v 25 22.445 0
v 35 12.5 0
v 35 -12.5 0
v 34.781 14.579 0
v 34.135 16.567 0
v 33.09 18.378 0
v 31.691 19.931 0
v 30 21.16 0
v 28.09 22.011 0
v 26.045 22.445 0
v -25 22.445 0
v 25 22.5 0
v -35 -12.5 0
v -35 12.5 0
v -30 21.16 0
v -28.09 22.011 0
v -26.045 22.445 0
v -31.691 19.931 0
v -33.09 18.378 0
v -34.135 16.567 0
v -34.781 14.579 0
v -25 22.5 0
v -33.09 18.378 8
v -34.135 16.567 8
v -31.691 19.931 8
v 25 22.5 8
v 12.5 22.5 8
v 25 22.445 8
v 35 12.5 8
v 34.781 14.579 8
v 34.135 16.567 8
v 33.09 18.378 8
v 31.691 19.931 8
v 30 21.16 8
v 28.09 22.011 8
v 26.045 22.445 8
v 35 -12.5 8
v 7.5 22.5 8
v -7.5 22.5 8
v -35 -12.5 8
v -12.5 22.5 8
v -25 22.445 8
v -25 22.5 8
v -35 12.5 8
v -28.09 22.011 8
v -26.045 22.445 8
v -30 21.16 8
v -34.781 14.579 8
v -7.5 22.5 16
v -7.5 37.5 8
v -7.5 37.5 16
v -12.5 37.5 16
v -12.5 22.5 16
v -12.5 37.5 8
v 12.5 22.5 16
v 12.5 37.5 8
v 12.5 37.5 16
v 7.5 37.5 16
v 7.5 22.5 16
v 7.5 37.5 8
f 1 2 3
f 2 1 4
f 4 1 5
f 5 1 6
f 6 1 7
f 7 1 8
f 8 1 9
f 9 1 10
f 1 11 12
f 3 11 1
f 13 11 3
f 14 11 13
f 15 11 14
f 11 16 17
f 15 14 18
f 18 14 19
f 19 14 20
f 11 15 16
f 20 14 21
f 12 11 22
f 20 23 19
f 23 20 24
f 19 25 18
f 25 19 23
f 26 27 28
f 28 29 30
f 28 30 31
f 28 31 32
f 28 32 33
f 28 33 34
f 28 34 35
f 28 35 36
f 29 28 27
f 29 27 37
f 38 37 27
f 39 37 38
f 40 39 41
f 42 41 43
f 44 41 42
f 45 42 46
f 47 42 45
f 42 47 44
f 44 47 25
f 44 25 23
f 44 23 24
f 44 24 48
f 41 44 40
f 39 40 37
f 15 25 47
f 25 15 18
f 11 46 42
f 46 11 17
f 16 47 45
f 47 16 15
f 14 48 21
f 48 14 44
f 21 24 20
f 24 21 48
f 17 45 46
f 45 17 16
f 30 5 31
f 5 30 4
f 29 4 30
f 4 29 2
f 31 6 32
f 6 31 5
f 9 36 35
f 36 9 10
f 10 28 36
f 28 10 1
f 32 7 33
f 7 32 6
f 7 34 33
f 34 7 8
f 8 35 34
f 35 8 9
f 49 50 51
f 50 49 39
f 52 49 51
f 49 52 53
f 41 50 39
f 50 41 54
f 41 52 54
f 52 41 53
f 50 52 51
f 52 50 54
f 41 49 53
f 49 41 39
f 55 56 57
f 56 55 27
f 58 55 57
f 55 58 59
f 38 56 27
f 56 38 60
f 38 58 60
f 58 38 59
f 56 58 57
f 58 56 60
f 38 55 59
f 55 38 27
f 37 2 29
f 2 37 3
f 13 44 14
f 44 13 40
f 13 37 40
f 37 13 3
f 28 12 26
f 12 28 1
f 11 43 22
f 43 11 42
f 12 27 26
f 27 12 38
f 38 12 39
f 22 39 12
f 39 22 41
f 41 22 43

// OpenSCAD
// ./lockerclip/lockerclip_female.scad
// Copyright (C) 2013 Christopher Robertsi

// Base dimensions
height = 8;
width = 70; 
depth = 25;
roundedness = 10;

// Clip dimensions
length = 15;


module base_female() {

    difference() {

        // Things that exist
        union() {
            translate( v = [ -width/2, -depth/2, 0] ) {
                cube( size = [ width, depth, height] );
            }

            for (x = [-width/2 + roundedness, width/2 - roundedness] ) {
                translate( v = [ x, depth/2, 0] ) {
                    cylinder( r = roundedness, h = height );
                }
            }

            translate ( v = [-width/2 + roundedness, depth/2, 0] ) {
                cube( size = [ width - roundedness*2, roundedness, height] );
            }

            for (x = [-10 - 5/2, 10 - 5/2] ) {
                translate( v = [ x, depth/2 + roundedness, height] ) {
                    cube( size = [ 5, 15, height] );
                }
            }

        }

        // Things to be cut out
        union() {

        }
    }

}

base_female();

// -------------------------------------------------------------------------------------------
// Commands
// -------------------------------------------------------------------------------------------

// http://en.wikibooks.org/wiki/OpenSCAD_User_Manual

// primitives
// cube(size = [1,2,3], center = true);
// sphere( r = 10, $fn=100 );
// circle( r = 10 );
// cylinder( h = 10, r = 20, $fs = 6, center = true );
// cylinder( h = 10, r1 = 10, r2 = 20, $fs = 6, center = false );
// polyhedron(points = [ [x, y, z], ... ], triangles = [ [p1, p2, p3..], ... ], convexity = N);
// polygon(points = [ [x, y], ... ], paths = [ [p1, p2, p3..], ... ], convexity = N);

// transormations
// scale(v = [x, y, z]) { ... }
// rotate(a=[0,180,0]) { ... }
// translate(v = [x, y, z]) { ... }
// mirror([ 0, 1, 0 ]) { ... }

// rounded box by combining a cube and single cylinder
// $fn=50;
// minkowski() {
//   cube([10,10,1]);
//   cylinder(r=2,h=1);
// }

// hull() {
//   translate([15,10,0]) circle(10);
//   circle(10);
// }

// linear_extrude(height=1, convexity = 1) import("tridentlogo.dxf");
// deprecated - dxf_linear_extrude(file="tridentlogo.dxf", height = 1, center = false, convexity = 10);
// deprecated - import_dxf(file="design.dxf", layer="layername", origin = [100,100], scale = 0.5);
// linear_extrude(height = 10, center = true, convexity = 10, twist = 0, $fn = 100)
// rotate_extrude(convexity = 10, $fn = 100)
// import_stl("example012.stl", convexity = 5);

// for (z = [-1, 1] ) { ... } // two iterations, z = -1, z = 1
// for (z = [ 0 : 5 ] ) { ... } // range of interations step 1
// for (z = [ 0 : 2 : 5 ] ) { ... } // range of interations step 2

// for (i = [ [ 0, 0, 0 ], [...] ] ) { ... } // range of rotations or vectors
// usage say rotate($i) or translate($i)
// if ( x > y ) { ... } else { ... }
// assign (angle = i*360/20, distance = i*10, r = i*2)

// text http://www.thingiverse.com/thing:25036
// inkscape / select all items
// objects to path
// select the object to export
// extensions / generate from path / paths to openscad
